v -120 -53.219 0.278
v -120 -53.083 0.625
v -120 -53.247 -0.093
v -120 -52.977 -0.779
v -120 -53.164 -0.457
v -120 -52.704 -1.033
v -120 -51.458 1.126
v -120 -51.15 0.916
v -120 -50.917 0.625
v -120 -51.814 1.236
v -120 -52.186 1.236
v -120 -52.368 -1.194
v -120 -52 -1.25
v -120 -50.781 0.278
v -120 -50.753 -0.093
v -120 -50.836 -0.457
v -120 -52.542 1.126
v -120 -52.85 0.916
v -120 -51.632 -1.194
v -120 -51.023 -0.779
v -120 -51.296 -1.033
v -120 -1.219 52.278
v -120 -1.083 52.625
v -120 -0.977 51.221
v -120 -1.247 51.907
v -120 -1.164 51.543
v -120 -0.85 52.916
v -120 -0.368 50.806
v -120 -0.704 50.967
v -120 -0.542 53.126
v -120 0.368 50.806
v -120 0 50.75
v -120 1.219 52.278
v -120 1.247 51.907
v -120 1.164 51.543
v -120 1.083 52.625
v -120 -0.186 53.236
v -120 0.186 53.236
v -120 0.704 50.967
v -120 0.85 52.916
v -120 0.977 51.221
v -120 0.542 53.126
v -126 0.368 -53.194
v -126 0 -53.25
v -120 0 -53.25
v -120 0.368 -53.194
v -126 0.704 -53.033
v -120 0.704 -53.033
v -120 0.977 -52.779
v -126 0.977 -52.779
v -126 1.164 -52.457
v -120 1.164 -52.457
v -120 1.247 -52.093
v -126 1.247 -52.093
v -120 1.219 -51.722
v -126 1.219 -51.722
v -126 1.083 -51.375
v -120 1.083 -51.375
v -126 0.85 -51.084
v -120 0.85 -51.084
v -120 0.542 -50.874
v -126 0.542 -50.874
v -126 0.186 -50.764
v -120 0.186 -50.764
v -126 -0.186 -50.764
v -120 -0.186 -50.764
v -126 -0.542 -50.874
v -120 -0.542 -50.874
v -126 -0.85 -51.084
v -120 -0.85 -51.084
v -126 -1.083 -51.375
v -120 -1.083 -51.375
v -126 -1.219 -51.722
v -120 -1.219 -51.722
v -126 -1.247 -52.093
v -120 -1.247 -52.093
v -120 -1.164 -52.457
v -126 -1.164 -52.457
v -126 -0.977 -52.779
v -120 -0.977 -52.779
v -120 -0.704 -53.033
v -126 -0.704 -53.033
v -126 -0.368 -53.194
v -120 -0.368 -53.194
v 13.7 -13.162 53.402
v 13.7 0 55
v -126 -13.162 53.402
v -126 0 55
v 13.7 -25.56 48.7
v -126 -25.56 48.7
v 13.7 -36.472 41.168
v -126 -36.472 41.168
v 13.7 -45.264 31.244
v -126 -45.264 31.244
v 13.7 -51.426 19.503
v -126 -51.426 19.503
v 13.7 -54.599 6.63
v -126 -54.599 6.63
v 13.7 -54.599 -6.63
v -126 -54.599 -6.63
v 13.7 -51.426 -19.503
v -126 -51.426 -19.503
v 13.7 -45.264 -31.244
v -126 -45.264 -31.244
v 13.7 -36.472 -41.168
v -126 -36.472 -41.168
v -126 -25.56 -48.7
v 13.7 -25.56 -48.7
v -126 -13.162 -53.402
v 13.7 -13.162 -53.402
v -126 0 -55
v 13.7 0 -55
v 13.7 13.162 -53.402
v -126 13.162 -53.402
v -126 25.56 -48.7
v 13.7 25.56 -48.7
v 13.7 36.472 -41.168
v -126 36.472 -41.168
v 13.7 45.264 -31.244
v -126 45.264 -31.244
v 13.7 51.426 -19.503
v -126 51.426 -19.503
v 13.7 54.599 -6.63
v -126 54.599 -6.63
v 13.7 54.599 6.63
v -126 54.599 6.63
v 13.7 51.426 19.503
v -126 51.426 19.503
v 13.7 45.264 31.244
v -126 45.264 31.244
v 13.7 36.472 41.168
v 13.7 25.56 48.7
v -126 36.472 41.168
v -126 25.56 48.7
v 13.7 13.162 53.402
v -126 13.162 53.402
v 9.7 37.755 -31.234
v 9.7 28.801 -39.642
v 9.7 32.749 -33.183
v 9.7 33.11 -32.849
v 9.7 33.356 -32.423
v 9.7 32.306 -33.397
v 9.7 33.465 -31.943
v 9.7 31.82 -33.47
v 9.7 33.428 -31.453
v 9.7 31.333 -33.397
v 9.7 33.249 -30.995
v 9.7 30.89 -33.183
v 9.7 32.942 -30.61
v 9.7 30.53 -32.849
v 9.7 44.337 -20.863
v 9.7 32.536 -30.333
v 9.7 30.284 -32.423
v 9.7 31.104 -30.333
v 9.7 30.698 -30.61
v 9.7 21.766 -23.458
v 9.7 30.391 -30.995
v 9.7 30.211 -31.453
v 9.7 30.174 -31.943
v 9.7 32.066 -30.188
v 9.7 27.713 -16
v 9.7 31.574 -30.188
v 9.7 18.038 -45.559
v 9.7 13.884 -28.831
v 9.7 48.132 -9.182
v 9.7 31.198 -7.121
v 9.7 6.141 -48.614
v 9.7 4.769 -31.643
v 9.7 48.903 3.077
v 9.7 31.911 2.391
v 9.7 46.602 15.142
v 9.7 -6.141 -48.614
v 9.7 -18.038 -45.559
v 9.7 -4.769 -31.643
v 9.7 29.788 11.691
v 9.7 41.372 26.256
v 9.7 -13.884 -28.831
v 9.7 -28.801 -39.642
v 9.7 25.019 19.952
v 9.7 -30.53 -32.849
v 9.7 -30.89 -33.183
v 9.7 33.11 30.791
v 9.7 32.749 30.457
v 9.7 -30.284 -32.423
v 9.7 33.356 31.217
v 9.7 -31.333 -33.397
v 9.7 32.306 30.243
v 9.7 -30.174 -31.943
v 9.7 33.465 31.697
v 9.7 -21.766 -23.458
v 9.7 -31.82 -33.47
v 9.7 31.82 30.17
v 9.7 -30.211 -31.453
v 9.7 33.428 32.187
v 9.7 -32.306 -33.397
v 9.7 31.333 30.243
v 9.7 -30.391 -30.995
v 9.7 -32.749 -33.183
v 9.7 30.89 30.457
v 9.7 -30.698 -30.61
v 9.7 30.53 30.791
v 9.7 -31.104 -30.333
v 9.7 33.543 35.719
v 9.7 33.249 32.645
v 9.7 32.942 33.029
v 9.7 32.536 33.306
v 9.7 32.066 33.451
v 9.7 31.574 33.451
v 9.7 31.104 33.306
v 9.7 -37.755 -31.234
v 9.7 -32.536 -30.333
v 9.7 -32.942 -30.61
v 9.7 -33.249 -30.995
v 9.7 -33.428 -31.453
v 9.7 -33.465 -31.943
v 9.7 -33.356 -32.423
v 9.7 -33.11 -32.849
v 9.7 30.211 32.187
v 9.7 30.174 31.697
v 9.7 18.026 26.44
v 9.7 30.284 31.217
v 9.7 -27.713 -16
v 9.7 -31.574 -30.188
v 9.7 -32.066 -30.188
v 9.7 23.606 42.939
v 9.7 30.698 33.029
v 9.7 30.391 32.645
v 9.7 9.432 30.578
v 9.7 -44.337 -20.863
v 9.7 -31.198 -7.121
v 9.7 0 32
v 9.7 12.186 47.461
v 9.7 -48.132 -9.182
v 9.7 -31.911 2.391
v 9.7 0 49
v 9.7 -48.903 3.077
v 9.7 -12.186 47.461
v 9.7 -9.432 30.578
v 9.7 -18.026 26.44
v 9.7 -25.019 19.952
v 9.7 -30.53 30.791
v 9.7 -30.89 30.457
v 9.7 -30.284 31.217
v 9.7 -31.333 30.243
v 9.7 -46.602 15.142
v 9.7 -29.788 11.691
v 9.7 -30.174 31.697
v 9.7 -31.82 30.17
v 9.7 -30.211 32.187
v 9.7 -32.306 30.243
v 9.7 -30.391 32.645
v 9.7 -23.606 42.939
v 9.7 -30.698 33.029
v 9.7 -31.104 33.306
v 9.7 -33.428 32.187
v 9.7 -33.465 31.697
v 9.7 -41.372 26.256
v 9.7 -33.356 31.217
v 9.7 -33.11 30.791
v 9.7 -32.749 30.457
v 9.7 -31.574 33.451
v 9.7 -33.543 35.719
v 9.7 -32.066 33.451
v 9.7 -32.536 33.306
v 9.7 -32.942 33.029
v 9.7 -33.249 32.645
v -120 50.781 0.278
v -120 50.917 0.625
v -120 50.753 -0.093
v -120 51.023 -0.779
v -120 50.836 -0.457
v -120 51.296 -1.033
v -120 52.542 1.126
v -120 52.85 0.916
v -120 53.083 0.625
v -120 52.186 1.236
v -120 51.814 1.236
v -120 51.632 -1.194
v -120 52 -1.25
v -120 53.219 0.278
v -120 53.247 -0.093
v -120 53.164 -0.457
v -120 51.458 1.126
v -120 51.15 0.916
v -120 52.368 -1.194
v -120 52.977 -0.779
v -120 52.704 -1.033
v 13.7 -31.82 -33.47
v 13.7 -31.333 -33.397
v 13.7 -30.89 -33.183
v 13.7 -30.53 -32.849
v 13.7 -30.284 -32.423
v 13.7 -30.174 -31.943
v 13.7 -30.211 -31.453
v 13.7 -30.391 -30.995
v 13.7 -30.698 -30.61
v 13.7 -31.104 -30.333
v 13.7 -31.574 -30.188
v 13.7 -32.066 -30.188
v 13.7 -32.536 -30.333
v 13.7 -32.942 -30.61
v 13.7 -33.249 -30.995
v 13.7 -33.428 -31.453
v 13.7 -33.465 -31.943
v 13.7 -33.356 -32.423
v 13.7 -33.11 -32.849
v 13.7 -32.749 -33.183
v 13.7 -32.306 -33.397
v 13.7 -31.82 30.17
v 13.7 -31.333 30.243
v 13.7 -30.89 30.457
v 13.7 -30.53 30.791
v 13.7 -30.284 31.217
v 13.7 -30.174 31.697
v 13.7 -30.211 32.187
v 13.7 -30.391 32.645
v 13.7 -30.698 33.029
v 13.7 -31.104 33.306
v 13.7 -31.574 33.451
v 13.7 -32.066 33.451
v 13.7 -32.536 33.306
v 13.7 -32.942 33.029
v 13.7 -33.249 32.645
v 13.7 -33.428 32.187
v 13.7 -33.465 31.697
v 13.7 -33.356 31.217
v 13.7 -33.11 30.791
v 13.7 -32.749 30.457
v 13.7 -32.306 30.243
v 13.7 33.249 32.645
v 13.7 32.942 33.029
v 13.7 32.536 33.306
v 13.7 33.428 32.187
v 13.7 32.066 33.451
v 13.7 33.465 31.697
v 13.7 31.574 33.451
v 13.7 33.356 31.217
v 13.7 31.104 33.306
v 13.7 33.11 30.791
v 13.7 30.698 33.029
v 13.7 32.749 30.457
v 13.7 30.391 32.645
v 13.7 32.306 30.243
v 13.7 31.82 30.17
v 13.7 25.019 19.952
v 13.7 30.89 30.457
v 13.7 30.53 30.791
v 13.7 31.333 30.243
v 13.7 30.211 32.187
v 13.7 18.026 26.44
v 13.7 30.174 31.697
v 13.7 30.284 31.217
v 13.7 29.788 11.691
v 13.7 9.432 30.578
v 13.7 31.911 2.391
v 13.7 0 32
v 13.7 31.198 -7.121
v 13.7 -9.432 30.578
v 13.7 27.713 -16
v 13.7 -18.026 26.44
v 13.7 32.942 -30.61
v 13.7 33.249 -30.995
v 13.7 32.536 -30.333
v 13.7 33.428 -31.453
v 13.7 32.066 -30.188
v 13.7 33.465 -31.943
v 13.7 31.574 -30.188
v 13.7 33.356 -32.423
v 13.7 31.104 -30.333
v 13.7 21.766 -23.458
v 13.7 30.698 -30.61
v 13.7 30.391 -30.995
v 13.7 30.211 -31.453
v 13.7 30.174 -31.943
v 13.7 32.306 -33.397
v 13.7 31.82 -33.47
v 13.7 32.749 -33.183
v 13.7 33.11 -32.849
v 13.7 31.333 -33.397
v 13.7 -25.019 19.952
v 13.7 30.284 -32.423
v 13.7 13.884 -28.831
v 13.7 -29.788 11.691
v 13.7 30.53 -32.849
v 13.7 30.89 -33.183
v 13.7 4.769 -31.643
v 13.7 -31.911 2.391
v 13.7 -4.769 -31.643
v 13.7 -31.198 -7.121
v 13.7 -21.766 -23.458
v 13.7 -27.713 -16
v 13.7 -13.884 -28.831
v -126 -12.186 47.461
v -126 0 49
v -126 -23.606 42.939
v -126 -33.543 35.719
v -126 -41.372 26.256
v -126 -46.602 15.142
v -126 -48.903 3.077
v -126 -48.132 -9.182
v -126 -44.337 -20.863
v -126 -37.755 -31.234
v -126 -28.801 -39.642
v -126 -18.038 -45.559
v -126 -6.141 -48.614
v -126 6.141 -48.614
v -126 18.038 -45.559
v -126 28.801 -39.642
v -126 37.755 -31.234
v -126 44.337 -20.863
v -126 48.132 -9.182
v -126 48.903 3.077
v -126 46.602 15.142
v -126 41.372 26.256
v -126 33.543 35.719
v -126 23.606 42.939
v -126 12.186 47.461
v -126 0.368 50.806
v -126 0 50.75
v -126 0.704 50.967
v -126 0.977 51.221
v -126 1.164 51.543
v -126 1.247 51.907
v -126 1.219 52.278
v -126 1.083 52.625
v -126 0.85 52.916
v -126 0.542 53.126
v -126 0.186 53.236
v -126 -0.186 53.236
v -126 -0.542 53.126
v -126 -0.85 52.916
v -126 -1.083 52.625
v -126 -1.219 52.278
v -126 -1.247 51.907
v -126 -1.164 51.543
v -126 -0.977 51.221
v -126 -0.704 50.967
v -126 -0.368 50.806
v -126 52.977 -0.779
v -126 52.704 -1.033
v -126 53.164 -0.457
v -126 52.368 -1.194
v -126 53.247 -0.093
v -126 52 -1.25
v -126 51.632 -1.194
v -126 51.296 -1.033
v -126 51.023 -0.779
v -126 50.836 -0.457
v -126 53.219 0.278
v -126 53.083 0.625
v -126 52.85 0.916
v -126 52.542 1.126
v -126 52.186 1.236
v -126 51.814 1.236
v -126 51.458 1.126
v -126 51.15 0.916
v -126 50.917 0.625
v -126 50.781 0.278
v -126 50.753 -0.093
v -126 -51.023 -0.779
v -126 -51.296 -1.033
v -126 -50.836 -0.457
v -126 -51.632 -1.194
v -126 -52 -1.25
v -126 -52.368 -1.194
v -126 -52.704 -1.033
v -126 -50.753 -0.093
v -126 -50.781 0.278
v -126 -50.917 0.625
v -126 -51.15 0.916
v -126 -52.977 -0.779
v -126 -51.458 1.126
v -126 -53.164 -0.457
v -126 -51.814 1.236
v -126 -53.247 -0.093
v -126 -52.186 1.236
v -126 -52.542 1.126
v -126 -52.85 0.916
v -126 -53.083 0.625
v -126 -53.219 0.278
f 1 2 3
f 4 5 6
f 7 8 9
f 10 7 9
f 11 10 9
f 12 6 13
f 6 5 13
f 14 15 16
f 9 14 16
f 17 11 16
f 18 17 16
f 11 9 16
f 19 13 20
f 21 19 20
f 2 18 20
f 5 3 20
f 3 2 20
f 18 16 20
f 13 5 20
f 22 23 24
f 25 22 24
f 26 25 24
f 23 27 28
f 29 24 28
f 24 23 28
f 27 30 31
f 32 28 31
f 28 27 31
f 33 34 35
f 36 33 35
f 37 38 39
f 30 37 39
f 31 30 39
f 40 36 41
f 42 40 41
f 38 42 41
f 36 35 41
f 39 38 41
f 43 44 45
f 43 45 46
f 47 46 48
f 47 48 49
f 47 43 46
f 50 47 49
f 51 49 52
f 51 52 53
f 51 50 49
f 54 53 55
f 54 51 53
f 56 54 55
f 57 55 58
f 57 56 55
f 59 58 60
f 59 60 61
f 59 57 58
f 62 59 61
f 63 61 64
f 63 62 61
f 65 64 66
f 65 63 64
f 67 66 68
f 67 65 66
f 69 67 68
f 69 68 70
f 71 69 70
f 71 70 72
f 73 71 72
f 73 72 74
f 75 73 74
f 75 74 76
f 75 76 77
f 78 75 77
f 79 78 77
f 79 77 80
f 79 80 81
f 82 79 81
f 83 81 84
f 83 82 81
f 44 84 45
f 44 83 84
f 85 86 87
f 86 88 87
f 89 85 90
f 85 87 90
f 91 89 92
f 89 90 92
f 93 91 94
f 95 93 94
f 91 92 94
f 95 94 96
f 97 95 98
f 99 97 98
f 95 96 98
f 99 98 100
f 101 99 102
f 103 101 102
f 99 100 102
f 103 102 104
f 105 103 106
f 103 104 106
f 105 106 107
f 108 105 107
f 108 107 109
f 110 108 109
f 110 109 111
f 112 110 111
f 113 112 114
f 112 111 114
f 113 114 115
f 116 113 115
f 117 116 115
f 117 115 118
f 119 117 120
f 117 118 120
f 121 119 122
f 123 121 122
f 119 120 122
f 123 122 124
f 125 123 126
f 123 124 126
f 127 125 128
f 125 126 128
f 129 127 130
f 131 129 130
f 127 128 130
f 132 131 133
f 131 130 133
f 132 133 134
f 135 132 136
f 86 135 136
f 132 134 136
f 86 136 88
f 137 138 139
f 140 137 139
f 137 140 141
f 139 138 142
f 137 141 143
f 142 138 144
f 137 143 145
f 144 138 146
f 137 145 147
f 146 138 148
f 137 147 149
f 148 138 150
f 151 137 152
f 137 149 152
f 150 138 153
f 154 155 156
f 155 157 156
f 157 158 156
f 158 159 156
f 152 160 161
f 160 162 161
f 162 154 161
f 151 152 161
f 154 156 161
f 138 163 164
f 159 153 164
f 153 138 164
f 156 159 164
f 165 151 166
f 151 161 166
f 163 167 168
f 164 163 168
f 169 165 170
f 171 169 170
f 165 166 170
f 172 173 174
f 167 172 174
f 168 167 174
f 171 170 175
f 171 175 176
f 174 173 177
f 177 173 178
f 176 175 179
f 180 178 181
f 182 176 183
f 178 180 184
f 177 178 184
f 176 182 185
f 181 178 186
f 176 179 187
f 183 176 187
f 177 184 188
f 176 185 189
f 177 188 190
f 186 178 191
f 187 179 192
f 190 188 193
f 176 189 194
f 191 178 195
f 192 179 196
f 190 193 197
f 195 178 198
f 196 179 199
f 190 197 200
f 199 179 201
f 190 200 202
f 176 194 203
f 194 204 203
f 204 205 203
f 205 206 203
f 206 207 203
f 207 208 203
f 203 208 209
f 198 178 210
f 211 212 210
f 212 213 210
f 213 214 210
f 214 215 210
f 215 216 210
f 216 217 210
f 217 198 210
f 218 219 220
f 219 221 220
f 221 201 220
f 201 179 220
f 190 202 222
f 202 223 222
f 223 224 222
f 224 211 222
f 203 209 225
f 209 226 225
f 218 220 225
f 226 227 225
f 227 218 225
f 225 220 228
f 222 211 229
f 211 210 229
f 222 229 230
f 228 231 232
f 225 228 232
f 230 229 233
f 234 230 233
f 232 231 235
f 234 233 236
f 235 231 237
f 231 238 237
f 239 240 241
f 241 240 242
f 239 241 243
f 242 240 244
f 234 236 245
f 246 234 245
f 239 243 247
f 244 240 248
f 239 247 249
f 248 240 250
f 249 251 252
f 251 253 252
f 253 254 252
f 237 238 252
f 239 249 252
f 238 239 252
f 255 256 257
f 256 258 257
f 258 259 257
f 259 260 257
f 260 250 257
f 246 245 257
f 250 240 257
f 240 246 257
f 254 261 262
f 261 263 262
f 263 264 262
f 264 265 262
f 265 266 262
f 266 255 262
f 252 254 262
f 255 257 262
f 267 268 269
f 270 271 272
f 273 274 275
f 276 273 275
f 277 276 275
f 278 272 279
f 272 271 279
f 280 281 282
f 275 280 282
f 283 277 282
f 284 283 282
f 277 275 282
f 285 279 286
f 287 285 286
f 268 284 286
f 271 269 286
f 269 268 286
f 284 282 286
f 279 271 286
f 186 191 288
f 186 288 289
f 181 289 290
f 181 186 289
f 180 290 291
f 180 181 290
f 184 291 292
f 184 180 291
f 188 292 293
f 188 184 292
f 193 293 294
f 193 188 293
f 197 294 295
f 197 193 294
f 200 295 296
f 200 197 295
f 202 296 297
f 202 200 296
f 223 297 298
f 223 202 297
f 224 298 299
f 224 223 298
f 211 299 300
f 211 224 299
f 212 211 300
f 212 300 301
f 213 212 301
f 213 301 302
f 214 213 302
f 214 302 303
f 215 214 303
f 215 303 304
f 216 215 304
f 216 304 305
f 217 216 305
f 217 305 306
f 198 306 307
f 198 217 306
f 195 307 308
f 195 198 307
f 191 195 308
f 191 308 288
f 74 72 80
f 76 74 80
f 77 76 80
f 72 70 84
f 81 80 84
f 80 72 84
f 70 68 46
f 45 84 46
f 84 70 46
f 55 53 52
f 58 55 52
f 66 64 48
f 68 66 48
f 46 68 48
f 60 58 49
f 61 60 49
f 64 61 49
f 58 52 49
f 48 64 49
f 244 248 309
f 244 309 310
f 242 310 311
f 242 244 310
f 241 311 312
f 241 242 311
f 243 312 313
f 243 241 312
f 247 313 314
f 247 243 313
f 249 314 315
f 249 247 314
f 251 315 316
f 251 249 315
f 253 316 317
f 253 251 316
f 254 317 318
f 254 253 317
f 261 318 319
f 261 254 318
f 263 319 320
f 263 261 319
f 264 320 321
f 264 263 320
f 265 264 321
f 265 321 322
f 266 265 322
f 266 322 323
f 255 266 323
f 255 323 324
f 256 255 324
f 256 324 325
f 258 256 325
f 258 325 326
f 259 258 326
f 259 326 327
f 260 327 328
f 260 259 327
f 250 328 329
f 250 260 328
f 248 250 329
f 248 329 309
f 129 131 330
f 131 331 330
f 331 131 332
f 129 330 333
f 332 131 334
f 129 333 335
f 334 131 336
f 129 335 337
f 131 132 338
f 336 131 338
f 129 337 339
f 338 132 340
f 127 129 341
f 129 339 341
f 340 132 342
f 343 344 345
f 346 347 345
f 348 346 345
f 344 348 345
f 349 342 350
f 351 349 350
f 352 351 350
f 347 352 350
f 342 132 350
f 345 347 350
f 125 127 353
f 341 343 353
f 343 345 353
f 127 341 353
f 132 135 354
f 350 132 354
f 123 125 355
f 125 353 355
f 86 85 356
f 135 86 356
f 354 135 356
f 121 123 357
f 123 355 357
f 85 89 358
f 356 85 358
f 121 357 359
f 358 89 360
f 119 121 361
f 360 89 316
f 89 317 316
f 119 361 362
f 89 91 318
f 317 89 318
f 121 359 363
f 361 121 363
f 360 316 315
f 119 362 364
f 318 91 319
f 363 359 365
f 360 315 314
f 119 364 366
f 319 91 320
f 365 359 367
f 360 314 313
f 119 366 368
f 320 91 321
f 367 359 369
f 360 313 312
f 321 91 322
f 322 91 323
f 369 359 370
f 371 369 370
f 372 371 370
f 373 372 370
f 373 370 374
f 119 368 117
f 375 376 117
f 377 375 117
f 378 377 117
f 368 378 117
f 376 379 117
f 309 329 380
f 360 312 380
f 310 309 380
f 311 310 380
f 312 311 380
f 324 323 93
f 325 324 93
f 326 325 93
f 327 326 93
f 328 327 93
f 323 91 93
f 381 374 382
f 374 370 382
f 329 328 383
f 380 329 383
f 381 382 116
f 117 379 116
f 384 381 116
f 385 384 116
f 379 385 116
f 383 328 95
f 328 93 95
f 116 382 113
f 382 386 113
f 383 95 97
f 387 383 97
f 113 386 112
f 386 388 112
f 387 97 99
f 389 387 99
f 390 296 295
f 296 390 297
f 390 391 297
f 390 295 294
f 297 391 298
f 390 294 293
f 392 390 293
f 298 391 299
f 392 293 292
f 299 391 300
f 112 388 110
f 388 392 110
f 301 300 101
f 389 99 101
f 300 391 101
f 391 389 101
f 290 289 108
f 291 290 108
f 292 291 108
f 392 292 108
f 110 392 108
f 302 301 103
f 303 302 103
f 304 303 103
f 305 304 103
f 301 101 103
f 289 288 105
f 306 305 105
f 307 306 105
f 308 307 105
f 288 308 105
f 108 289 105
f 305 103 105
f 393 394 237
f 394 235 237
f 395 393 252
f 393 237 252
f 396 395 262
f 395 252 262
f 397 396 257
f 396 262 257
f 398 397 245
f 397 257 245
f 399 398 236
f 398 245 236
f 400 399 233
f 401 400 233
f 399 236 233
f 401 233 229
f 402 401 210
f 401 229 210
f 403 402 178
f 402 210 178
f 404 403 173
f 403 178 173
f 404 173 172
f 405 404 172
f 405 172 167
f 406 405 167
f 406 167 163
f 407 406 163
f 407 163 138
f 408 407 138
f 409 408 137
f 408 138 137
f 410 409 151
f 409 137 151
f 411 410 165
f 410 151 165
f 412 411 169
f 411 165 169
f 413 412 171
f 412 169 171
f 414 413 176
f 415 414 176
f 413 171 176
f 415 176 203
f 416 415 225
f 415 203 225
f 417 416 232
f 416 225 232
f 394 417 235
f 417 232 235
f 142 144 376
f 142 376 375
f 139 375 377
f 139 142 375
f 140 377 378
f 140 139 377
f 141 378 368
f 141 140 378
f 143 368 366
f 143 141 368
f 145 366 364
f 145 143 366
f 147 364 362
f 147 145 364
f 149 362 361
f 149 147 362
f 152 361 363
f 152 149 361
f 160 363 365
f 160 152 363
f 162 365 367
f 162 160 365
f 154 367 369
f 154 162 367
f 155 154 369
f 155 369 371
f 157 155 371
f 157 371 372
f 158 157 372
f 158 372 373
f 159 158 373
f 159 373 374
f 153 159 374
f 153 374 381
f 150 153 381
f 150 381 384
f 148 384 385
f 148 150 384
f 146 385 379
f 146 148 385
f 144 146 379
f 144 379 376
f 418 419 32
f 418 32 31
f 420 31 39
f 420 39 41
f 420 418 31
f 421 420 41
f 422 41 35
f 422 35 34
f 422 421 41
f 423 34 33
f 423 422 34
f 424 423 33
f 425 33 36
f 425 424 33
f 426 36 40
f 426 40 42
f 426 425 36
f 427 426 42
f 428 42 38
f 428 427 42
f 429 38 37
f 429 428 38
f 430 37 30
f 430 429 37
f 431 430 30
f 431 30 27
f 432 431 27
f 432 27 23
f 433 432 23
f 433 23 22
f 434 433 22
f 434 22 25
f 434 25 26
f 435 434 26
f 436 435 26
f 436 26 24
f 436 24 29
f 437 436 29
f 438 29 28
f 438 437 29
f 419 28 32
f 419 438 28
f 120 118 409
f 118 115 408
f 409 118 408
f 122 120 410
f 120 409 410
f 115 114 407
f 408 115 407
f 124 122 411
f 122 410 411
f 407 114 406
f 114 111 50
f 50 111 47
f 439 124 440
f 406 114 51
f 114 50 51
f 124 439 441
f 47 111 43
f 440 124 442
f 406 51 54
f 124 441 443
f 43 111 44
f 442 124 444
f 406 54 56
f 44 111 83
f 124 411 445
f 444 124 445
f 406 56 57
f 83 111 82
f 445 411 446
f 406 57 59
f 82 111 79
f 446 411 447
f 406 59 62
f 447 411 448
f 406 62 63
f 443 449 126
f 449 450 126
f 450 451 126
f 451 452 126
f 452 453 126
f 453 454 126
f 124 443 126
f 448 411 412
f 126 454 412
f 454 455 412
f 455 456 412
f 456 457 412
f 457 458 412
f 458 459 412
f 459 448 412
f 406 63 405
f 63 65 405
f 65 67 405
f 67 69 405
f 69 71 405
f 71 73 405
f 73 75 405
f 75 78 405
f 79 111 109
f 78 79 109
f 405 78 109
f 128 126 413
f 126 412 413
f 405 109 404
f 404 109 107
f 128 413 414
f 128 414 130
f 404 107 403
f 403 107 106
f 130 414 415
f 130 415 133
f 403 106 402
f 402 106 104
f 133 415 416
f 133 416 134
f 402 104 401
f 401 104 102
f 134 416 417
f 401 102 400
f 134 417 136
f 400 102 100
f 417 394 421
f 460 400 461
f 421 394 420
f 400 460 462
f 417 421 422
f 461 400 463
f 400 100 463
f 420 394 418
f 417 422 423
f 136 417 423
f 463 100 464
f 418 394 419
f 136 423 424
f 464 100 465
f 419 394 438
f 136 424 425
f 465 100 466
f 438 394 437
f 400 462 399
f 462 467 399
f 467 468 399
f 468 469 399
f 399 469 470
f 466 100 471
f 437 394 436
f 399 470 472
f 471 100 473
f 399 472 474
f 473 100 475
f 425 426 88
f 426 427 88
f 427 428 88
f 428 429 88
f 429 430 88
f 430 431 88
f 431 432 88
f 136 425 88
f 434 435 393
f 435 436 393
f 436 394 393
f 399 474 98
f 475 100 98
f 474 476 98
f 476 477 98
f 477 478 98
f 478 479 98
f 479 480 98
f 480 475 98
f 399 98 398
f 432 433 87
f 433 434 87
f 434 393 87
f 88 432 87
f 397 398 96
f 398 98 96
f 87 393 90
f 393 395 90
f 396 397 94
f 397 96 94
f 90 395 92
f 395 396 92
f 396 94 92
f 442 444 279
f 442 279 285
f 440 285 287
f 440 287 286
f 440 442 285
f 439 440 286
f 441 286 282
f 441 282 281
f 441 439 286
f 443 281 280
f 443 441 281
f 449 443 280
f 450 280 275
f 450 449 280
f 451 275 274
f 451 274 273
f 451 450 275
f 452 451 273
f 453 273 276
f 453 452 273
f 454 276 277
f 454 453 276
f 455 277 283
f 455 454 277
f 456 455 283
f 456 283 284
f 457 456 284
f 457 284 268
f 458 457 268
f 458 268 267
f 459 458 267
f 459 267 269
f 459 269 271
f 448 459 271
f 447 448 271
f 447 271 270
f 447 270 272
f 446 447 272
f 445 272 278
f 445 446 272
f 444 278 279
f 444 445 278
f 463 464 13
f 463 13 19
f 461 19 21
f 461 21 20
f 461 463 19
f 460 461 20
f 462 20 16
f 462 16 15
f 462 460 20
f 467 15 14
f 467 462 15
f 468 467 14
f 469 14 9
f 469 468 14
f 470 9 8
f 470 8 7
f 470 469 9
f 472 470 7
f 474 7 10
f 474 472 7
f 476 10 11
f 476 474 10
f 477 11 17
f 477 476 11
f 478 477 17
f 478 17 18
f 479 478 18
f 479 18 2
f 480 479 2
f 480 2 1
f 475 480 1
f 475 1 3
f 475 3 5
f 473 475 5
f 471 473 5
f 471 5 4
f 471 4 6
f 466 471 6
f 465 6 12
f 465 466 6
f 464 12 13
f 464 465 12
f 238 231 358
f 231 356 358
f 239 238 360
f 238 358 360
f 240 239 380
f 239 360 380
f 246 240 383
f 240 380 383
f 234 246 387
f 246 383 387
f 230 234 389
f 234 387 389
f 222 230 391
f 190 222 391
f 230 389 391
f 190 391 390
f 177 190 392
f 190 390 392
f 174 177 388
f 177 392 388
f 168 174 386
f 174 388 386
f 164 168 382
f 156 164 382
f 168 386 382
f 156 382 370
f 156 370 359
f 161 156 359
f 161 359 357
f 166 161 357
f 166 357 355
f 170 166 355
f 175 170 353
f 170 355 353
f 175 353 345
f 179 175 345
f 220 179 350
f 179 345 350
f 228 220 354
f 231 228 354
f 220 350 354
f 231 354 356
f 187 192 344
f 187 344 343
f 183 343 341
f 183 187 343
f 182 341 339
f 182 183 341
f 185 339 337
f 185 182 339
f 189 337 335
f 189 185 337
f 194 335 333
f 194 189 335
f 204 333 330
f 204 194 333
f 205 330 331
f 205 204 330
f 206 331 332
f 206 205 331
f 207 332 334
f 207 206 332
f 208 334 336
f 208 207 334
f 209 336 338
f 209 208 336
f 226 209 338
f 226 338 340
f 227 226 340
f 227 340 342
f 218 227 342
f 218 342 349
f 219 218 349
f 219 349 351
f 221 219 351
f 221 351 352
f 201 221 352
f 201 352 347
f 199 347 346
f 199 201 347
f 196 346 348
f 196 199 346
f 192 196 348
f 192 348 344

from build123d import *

# Parameters (mm, degrees)
AXIAL_START        = 9.7
SKETCH2_R          = 1.65
AXIAL_HOLES_DEPTH  = 4
CUT_EXTRUDE2_START = -126
SKETCH3_R          = 1.25
CUT_EXTRUDE2_DEPTH = 6


with BuildPart() as part:
    # Axial profile (mm) → Full revolution (revolve)
    with BuildSketch(Plane.XY, mode=Mode.PRIVATE) as full_revolution_sk:
        Polygon((-126, 49), (9.7, 49), (9.7, 32), (13.7, 32), (13.7, 55), (-126, 55), align=None)
    revolve(full_revolution_sk.sketch.rotate(Axis((-110, 0, 0), (1, 0, 0)), 90), axis=Axis((-110, 0, 0), (1, 0, 0)))

    # Sketch2 → Axial holes (cut)
    with BuildSketch(Plane(origin=(0, 0, 0), x_dir=(0, 0, -1), z_dir=(1, 0, 0)).offset(AXIAL_START)):
        with Locations((-31.819805153, 31.819805153)):
            Circle(SKETCH2_R)
        with Locations((-31.819805153, -31.819805153)):
            Circle(SKETCH2_R)
        with Locations((31.819805153, -31.819805153)):
            Circle(SKETCH2_R)
        with Locations((31.819805153, 31.819805153)):
            Circle(SKETCH2_R)
    extrude(amount=AXIAL_HOLES_DEPTH, mode=Mode.SUBTRACT)

    # Sketch3 → Cut-Extrude2 (cut)
    with BuildSketch(Plane(origin=(0, 0, 0), x_dir=(0, 0, -1), z_dir=(1, 0, 0)).offset(CUT_EXTRUDE2_START)):
        with Locations((0, 52)):
            Circle(SKETCH3_R)
        with Locations((-52, 0)):
            Circle(SKETCH3_R)
        with Locations((0, -52)):
            Circle(SKETCH3_R)
        with Locations((52, 0)):
            Circle(SKETCH3_R)
    extrude(amount=CUT_EXTRUDE2_DEPTH, mode=Mode.SUBTRACT)


solid = part.part
